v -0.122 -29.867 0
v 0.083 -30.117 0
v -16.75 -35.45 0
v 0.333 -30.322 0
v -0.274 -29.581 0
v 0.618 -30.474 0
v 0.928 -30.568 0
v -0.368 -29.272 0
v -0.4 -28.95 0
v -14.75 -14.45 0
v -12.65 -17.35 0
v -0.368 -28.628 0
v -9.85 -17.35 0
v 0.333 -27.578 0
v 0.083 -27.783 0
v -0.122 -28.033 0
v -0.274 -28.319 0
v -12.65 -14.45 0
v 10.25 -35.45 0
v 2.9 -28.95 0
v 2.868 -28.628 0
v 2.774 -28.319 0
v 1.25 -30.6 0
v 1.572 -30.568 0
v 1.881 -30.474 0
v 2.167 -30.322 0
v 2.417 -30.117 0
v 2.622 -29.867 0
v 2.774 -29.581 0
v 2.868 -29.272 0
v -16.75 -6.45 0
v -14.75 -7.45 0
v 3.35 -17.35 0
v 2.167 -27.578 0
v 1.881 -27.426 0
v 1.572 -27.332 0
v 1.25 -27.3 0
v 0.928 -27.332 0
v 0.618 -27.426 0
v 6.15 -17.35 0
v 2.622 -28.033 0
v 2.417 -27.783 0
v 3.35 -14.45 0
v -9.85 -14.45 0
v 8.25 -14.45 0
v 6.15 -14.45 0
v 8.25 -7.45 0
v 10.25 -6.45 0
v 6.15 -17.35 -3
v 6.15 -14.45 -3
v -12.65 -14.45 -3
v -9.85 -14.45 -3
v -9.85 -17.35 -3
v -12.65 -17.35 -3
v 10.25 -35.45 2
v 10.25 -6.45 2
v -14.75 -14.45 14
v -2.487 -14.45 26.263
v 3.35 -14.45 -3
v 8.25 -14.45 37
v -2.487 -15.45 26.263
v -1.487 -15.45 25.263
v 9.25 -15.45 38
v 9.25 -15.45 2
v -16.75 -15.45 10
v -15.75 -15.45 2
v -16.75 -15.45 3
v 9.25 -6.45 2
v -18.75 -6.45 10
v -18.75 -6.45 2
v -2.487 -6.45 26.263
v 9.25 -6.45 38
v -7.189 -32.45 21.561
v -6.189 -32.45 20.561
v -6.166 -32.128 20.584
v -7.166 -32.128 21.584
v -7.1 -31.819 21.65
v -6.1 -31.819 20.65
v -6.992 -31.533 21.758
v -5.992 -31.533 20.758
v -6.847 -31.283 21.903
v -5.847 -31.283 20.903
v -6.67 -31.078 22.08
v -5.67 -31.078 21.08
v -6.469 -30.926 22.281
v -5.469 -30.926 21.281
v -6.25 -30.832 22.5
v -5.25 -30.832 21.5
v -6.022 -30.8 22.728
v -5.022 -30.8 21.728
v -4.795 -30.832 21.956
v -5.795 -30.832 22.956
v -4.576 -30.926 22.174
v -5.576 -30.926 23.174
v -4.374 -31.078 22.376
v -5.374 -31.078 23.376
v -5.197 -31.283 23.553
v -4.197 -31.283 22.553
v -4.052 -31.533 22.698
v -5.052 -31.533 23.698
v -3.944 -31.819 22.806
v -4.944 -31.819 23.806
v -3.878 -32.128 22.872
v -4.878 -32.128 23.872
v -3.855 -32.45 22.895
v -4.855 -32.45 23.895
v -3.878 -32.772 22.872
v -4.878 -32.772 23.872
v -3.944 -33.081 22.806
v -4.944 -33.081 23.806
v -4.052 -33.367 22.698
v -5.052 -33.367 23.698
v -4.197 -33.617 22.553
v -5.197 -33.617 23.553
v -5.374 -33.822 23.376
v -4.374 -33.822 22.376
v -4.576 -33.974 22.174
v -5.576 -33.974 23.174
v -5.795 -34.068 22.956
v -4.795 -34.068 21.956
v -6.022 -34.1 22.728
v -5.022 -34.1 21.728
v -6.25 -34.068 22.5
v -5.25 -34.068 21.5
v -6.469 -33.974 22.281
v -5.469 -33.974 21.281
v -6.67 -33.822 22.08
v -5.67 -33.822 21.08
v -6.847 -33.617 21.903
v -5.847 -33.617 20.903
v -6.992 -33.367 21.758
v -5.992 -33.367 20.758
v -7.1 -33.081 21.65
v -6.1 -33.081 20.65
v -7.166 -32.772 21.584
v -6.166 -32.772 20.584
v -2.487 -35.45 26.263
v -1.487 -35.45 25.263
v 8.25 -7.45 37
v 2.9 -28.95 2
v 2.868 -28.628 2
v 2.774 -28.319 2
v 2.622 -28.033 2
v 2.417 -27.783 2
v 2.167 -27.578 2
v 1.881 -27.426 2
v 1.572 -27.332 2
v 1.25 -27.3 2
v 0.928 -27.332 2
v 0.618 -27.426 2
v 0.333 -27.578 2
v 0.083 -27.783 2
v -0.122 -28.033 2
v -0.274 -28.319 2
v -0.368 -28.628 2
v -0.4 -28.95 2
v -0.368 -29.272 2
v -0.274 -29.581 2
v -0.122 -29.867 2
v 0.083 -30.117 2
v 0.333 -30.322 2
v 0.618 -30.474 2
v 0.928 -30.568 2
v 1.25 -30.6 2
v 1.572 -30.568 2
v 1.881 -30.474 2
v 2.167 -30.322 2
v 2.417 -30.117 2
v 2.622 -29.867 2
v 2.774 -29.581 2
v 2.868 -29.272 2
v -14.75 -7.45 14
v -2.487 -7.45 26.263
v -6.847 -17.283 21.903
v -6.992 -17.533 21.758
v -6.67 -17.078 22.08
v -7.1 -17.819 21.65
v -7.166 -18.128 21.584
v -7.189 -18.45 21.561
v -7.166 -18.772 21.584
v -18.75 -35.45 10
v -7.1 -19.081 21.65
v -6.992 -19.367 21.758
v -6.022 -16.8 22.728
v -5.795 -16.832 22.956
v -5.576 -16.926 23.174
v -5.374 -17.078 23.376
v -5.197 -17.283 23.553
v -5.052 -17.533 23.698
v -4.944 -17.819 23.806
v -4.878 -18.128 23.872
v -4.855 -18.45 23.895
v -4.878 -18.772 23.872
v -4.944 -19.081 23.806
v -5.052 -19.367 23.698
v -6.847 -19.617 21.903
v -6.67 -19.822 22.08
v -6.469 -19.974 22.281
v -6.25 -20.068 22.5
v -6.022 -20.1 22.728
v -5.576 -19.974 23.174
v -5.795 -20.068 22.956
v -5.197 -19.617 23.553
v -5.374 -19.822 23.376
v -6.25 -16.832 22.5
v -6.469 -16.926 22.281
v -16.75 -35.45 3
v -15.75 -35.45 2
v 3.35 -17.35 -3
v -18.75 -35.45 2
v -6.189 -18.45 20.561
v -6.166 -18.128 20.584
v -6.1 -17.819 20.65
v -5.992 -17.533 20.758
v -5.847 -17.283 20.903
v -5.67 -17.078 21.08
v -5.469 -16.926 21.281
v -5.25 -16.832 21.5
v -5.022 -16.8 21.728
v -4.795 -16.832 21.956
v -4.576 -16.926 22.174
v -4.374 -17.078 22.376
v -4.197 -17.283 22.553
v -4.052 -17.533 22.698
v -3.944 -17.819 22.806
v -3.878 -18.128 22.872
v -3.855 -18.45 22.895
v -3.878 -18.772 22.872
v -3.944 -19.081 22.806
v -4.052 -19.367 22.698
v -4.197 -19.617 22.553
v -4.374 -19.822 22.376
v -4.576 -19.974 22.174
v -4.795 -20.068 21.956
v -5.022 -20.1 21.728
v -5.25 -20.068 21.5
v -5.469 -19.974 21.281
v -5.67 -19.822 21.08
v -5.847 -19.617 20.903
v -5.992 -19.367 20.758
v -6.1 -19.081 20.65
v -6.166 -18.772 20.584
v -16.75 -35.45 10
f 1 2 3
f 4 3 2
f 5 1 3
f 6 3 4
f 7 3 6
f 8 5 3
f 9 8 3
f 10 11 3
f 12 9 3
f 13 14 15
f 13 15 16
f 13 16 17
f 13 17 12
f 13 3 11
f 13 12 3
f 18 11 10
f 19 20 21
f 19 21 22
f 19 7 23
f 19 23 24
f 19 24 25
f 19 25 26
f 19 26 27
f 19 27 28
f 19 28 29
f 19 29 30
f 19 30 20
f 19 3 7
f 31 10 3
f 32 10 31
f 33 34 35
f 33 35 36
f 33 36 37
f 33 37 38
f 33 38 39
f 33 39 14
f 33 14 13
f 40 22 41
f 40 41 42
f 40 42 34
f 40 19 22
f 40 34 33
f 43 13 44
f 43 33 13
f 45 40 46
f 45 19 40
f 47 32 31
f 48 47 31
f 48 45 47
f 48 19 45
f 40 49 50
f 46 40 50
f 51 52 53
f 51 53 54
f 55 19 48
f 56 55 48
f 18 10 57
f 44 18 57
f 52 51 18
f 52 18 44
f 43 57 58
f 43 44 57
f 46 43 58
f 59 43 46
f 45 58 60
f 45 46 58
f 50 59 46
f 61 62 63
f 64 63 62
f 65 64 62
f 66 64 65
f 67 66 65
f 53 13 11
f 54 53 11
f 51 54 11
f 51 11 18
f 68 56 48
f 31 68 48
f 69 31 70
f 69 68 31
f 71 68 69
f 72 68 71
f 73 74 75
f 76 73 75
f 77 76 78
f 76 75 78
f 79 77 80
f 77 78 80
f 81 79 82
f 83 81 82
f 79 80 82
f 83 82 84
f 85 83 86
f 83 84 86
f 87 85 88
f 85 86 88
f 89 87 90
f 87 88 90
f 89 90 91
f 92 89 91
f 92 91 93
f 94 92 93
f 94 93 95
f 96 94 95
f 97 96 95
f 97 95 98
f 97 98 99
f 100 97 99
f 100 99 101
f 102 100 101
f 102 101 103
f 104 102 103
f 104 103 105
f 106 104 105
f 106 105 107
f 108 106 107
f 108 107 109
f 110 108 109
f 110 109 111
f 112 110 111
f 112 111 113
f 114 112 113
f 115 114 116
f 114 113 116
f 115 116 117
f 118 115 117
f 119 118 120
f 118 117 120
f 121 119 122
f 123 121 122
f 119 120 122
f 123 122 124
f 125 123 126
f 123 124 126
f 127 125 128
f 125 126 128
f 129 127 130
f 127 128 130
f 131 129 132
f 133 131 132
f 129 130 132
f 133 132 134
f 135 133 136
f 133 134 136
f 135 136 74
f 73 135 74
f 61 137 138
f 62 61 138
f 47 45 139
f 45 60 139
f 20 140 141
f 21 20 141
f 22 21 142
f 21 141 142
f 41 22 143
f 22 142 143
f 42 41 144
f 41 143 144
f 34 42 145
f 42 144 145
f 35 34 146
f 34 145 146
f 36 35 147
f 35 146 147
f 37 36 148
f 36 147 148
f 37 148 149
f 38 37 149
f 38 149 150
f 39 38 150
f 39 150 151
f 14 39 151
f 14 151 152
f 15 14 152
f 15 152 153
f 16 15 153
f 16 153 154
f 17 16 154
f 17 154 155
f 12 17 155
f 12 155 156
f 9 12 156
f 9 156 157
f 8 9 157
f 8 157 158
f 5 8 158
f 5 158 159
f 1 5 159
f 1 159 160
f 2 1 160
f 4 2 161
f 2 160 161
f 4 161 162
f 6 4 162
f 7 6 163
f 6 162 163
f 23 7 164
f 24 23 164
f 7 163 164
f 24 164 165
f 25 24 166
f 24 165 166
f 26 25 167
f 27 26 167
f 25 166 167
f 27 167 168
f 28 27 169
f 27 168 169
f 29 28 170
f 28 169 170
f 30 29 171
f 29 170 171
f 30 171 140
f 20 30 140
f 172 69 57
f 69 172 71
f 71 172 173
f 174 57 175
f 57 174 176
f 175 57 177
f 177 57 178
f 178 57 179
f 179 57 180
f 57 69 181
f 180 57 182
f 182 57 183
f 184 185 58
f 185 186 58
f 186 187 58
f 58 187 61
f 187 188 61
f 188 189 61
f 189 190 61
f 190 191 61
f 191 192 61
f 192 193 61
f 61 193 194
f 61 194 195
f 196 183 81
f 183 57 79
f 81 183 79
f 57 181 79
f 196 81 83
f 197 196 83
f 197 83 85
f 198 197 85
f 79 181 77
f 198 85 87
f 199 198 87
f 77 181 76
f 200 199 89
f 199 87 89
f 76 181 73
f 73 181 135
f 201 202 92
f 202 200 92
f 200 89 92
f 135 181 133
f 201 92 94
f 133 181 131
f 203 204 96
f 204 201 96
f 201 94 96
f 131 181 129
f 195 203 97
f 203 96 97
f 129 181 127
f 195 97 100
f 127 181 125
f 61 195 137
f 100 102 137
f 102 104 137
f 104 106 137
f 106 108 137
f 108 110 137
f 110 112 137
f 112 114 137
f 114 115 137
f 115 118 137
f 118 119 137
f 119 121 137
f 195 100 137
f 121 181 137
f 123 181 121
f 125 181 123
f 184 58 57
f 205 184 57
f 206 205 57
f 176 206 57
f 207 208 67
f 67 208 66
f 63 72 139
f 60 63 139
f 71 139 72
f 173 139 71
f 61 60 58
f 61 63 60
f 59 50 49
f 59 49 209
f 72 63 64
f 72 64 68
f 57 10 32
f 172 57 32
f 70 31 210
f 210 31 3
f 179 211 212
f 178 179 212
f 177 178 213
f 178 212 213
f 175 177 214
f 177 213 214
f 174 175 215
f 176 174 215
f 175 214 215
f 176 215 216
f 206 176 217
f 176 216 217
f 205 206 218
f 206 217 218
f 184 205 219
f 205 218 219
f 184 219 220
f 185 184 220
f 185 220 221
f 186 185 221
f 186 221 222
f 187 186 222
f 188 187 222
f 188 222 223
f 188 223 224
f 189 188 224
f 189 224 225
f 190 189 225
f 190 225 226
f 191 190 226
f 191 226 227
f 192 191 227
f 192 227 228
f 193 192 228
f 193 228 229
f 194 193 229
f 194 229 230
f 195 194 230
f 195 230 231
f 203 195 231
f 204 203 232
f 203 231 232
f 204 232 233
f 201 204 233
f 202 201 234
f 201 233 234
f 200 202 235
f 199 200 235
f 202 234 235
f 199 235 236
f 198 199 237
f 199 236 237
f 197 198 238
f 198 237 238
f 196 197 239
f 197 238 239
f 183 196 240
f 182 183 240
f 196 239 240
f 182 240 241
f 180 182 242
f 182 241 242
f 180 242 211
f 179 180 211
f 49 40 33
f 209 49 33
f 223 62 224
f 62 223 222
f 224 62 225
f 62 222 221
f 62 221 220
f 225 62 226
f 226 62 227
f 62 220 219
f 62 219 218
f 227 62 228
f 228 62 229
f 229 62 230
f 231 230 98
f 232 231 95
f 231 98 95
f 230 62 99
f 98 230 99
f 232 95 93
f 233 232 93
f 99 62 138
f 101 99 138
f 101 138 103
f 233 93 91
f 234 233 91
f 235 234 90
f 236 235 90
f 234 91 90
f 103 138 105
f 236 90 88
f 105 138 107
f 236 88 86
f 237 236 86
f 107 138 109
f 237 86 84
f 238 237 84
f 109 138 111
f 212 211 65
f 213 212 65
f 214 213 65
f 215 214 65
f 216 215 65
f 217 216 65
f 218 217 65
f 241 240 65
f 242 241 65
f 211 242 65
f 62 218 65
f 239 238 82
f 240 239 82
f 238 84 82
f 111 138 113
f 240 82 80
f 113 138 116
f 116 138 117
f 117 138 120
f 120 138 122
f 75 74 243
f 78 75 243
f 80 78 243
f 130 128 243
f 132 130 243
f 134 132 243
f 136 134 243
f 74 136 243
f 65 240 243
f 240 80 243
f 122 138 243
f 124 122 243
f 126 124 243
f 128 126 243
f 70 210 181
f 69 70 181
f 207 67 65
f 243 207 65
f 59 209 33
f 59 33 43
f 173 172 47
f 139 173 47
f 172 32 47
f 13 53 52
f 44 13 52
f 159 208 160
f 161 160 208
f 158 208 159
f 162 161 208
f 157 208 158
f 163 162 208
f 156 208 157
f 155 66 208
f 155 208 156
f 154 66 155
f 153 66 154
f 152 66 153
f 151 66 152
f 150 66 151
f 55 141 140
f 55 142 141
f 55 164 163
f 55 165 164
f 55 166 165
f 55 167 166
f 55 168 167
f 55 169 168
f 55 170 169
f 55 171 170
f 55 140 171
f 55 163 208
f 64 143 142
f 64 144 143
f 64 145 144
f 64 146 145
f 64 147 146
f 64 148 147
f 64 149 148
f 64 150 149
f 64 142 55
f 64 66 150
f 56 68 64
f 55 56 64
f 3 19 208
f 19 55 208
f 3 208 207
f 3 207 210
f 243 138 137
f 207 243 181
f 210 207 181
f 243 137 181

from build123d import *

# Parameters (mm, degrees)
SKETCH1_W                      = 27
SKETCH1_H                      = 29
BOSS_EXTRUDE1_DEPTH            = 2
SKETCH4_W                      = 10
SKETCH4_H                      = 29
BOSS_EXTRUDE3_DEPTH            = 2
BOSS_EXTRUDE4_DEPTH            = 29
SKETCH6_R                      = 1.65
CUT_EXTRUDE1_DEPTH             = 2
CHAMFER1_SIZE                  = 1
SKETCH7_W                      = 23
SKETCH7_H                      = 7
CUT_EXTRUDE3_DEPTH             = 2
CUT_EXTRUDE3_DIRECTION_2_REACH = 48.872
BOSS_EXTRUDE6_REACH            = 49.938
SKETCH9_W                      = 28
SKETCH9_H                      = 9
SKETCH9_W_2                    = 23
SKETCH9_H_2                    = 7
CHAMFER3_SIZE                  = 2
SKETCH10_R                     = 1.65
CUT_EXTRUDE4_DEPTH             = 10
SKETCH11_W                     = 2.8
SKETCH11_H                     = 2.9
BOSS_EXTRUDE7_DEPTH            = 3


with BuildPart() as part:
    # Sketch1 → Boss-Extrude1 (new body)
    with BuildSketch(Plane.XY):
        with Locations((-3.250075758, -20.95)):
            Rectangle(SKETCH1_W, SKETCH1_H)
    extrude(amount=BOSS_EXTRUDE1_DEPTH)

    # Sketch4 → Boss-Extrude3 (add)
    with BuildSketch(Plane.ZY.offset(16.750075758)):
        with Locations((5, -20.95)):
            Rectangle(SKETCH4_W, SKETCH4_H)
    extrude(amount=BOSS_EXTRUDE3_DEPTH)

    # Sketch5 → Boss-Extrude4 (add)
    with BuildSketch(Plane.XZ.offset(35.45)):
        Polygon((-18.750075758, 10), (-2.48661979, 26.263455967), (-1.48661979, 25.263455967), (-16.750075758, 10), align=None)
    extrude(amount=-BOSS_EXTRUDE4_DEPTH)

    # Sketch6 → Cut-Extrude1 (cut)
    with BuildSketch(Plane(origin=(-13.375037879, 0, 13.375037879), x_dir=(-0.7071067811865435, 0, -0.7071067811865517), z_dir=(0.7071067811865517, 0, -0.7071067811865435))):
        with Locations((-11.812762096, -32.45)):
            Circle(SKETCH6_R)
        with Locations((-11.812762096, -18.45)):
            Circle(SKETCH6_R)
    extrude(amount=-CUT_EXTRUDE1_DEPTH, mode=Mode.SUBTRACT)

    # Chamfer1
    chamfer1_edges = [part.edges().sort_by_distance(p)[0] for p in [
        (-16.750075758, -20.95, 2),
    ]]
    chamfer(chamfer1_edges, length=CHAMFER1_SIZE)

    # Sketch7 → Cut-Extrude3 (cut)
    with BuildSketch(Plane.XY.offset(2)):
        with Locations((-3.250075758, -10.95)):
            Rectangle(SKETCH7_W, SKETCH7_H)
    extrude(amount=-CUT_EXTRUDE3_DEPTH, mode=Mode.SUBTRACT)

    # Cut-Extrude3 direction 2: up to this plane
    cut_extrude3_direction_2_end = Plane(origin=(-18.750075758, 17.267649798, 10), z_dir=(-0.7071067811865512, 0, 0.7071067811865439))
    # Sketch7 → Cut-Extrude3 direction 2 (cut, up to the surface)
    with BuildSketch(Plane.XY.offset(2), mode=Mode.PRIVATE) as cut_extrude3_direction_2_sk1:
        with Locations((-3.250075758, -10.95)):
            Rectangle(SKETCH7_W, SKETCH7_H)
    cut_extrude3_direction_2_tool1 = split(extrude(cut_extrude3_direction_2_sk1.sketch, amount=CUT_EXTRUDE3_DIRECTION_2_REACH, mode=Mode.PRIVATE), bisect_by=cut_extrude3_direction_2_end, keep=Keep.BOTH, mode=Mode.PRIVATE)
    add(cut_extrude3_direction_2_tool1.solids().sort_by_distance((-3.250076, -10.95, 2))[0], mode=Mode.SUBTRACT)

    # Boss-Extrude6: up to this plane
    boss_extrude6_end = Plane(origin=(-18.750075758, 17.267649798, 10), z_dir=(-0.7071067811865512, 0, 0.7071067811865439))
    # Sketch9 → Boss-Extrude6 (add, up to the surface)
    with BuildSketch(Plane(origin=(0, 0, 0), x_dir=(-1, 0, 0), z_dir=(0, 0, -1)), mode=Mode.PRIVATE) as boss_extrude6_sk1:
        with Locations((4.750075758, -10.95)):
            Rectangle(SKETCH9_W, SKETCH9_H)
        with Locations((3.250075758, -10.95)):
            Rectangle(SKETCH9_W_2, SKETCH9_H_2, mode=Mode.SUBTRACT)
    boss_extrude6_tool1 = split(extrude(boss_extrude6_sk1.sketch, amount=-BOSS_EXTRUDE6_REACH, mode=Mode.PRIVATE), bisect_by=boss_extrude6_end, keep=Keep.BOTH, mode=Mode.PRIVATE)
    add(boss_extrude6_tool1.solids().sort_by_distance((-4.750076, -15.155891, 0))[0])

    # Chamfer3
    chamfer3_edges = [part.edges().sort_by_distance(p)[0] for p in [
        (-18.750075758, -20.95, 0),
    ]]
    chamfer(chamfer3_edges, length=CHAMFER3_SIZE)

    # Sketch10 → Cut-Extrude4 (cut)
    with BuildSketch(Plane.XY.offset(2)):
        with Locations((1.249924242, -28.95)):
            Circle(SKETCH10_R)
    extrude(amount=-CUT_EXTRUDE4_DEPTH, mode=Mode.SUBTRACT)

    # Sketch11 → Boss-Extrude7 (add)
    with BuildSketch(Plane(origin=(0, 0, 0), x_dir=(-1, 0, 0), z_dir=(0, 0, -1))):
        with Locations((-4.749924242, -15.9)):
            Rectangle(SKETCH11_W, SKETCH11_H)
        with Locations((11.250075758, -15.9)):
            Rectangle(SKETCH11_W, SKETCH11_H)
    extrude(amount=BOSS_EXTRUDE7_DEPTH)


solid = part.part
